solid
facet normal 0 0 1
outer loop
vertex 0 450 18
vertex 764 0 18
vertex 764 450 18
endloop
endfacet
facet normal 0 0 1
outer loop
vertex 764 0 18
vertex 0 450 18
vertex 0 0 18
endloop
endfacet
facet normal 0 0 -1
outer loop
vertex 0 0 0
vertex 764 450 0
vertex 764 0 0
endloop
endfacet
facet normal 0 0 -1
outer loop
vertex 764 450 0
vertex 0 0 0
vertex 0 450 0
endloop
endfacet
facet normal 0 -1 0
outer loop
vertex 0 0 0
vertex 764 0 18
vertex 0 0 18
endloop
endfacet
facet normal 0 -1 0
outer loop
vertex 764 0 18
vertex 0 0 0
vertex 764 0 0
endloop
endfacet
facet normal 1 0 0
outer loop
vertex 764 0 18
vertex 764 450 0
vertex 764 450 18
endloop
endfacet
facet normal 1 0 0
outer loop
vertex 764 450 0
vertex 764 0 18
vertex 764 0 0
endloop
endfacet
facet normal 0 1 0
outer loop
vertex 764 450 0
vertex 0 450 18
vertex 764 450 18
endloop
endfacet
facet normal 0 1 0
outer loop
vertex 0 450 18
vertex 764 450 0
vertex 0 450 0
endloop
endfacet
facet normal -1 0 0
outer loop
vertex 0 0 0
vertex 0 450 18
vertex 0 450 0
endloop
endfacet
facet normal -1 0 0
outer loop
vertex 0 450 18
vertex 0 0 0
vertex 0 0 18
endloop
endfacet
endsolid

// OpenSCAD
// file: ../config/TF3D-SDC-01_dimensions.scad
// TriFusión 3D – Smart Dry Cabinet
// Modelo TF3D-SDC-01 | Sprint 3.2 | Rev A
// Unidades: mm

CABINET_W = 800;
CABINET_H = 1000;
CABINET_D = 500;
BOARD_T = 18;

INNER_W = CABINET_W - 2*BOARD_T;
INNER_H = CABINET_H - 2*BOARD_T;

BACK_W = INNER_W;
BACK_H = INNER_H;
BACK_T = BOARD_T;

// Compartimento técnico inferior
TECH_H = 160;
TECH_LID_Z = TECH_H;

// Puerta sobrepuesta
DOOR_GAP = 3;
DOOR_W = CABINET_W - 2*DOOR_GAP;
DOOR_H = CABINET_H - 2*DOOR_GAP;
DOOR_FRAME = 30;
DOOR_FRAME_D = 20;
ACRYLIC_T = 6;
EPDM_T = 4;

// Soportes de carrete
SPOOL_ROWS = 4;
SPOOLS_PER_ROW = 4;
SPOOL_CENTERS_X = [110, 300, 490, 680];
SPOOL_ROWS_Z = [270, 475, 680, 885];
SUPPORT_PAIR_GAP = 82; // separación entre soportes de una misma bobina
ROD_D = 10;
ROD_L = 120;

// Soporte impreso
SUPPORT_W = 28;
SUPPORT_H = 72;
SUPPORT_D = 92;
MOUNT_T = 8;
CRADLE_R = 7;

// Ventilador previsto
FAN_SIZE = 120;
FAN_HOLE_SPACING = 105;
FAN_HOLE_D = 4.5;

// Apariencia
MELAMINE = [0.94,0.94,0.94];
PRINTED = [0.08,0.25,0.75];
METAL = [0.12,0.12,0.12];
ACRYLIC = [0.55,0.82,1.0,0.25];
SEAL = [0.05,0.05,0.05];
// file: ../config/common.scad
include <TF3D-SDC-01_dimensions.scad>

module board(size=[100,100,18], c=MELAMINE) {
    color(c) cube(size, center=false);
}

module rod(length=ROD_L, diameter=ROD_D) {
    color([0.65,0.65,0.68])
        rotate([0,90,0])
            cylinder(h=length, d=diameter, $fn=48);
}

module rounded_box(size=[20,20,20], r=3) {
    minkowski() {
        cube([size[0]-2*r,size[1]-2*r,size[2]-2*r]);
        sphere(r=r,$fn=24);
    }
}
// main file
include <../config/common.scad>
// Tapa horizontal desmontable del compartimento técnico
// Melamina 18 mm, 764 × 450 mm
board([INNER_W,450,BOARD_T]);
